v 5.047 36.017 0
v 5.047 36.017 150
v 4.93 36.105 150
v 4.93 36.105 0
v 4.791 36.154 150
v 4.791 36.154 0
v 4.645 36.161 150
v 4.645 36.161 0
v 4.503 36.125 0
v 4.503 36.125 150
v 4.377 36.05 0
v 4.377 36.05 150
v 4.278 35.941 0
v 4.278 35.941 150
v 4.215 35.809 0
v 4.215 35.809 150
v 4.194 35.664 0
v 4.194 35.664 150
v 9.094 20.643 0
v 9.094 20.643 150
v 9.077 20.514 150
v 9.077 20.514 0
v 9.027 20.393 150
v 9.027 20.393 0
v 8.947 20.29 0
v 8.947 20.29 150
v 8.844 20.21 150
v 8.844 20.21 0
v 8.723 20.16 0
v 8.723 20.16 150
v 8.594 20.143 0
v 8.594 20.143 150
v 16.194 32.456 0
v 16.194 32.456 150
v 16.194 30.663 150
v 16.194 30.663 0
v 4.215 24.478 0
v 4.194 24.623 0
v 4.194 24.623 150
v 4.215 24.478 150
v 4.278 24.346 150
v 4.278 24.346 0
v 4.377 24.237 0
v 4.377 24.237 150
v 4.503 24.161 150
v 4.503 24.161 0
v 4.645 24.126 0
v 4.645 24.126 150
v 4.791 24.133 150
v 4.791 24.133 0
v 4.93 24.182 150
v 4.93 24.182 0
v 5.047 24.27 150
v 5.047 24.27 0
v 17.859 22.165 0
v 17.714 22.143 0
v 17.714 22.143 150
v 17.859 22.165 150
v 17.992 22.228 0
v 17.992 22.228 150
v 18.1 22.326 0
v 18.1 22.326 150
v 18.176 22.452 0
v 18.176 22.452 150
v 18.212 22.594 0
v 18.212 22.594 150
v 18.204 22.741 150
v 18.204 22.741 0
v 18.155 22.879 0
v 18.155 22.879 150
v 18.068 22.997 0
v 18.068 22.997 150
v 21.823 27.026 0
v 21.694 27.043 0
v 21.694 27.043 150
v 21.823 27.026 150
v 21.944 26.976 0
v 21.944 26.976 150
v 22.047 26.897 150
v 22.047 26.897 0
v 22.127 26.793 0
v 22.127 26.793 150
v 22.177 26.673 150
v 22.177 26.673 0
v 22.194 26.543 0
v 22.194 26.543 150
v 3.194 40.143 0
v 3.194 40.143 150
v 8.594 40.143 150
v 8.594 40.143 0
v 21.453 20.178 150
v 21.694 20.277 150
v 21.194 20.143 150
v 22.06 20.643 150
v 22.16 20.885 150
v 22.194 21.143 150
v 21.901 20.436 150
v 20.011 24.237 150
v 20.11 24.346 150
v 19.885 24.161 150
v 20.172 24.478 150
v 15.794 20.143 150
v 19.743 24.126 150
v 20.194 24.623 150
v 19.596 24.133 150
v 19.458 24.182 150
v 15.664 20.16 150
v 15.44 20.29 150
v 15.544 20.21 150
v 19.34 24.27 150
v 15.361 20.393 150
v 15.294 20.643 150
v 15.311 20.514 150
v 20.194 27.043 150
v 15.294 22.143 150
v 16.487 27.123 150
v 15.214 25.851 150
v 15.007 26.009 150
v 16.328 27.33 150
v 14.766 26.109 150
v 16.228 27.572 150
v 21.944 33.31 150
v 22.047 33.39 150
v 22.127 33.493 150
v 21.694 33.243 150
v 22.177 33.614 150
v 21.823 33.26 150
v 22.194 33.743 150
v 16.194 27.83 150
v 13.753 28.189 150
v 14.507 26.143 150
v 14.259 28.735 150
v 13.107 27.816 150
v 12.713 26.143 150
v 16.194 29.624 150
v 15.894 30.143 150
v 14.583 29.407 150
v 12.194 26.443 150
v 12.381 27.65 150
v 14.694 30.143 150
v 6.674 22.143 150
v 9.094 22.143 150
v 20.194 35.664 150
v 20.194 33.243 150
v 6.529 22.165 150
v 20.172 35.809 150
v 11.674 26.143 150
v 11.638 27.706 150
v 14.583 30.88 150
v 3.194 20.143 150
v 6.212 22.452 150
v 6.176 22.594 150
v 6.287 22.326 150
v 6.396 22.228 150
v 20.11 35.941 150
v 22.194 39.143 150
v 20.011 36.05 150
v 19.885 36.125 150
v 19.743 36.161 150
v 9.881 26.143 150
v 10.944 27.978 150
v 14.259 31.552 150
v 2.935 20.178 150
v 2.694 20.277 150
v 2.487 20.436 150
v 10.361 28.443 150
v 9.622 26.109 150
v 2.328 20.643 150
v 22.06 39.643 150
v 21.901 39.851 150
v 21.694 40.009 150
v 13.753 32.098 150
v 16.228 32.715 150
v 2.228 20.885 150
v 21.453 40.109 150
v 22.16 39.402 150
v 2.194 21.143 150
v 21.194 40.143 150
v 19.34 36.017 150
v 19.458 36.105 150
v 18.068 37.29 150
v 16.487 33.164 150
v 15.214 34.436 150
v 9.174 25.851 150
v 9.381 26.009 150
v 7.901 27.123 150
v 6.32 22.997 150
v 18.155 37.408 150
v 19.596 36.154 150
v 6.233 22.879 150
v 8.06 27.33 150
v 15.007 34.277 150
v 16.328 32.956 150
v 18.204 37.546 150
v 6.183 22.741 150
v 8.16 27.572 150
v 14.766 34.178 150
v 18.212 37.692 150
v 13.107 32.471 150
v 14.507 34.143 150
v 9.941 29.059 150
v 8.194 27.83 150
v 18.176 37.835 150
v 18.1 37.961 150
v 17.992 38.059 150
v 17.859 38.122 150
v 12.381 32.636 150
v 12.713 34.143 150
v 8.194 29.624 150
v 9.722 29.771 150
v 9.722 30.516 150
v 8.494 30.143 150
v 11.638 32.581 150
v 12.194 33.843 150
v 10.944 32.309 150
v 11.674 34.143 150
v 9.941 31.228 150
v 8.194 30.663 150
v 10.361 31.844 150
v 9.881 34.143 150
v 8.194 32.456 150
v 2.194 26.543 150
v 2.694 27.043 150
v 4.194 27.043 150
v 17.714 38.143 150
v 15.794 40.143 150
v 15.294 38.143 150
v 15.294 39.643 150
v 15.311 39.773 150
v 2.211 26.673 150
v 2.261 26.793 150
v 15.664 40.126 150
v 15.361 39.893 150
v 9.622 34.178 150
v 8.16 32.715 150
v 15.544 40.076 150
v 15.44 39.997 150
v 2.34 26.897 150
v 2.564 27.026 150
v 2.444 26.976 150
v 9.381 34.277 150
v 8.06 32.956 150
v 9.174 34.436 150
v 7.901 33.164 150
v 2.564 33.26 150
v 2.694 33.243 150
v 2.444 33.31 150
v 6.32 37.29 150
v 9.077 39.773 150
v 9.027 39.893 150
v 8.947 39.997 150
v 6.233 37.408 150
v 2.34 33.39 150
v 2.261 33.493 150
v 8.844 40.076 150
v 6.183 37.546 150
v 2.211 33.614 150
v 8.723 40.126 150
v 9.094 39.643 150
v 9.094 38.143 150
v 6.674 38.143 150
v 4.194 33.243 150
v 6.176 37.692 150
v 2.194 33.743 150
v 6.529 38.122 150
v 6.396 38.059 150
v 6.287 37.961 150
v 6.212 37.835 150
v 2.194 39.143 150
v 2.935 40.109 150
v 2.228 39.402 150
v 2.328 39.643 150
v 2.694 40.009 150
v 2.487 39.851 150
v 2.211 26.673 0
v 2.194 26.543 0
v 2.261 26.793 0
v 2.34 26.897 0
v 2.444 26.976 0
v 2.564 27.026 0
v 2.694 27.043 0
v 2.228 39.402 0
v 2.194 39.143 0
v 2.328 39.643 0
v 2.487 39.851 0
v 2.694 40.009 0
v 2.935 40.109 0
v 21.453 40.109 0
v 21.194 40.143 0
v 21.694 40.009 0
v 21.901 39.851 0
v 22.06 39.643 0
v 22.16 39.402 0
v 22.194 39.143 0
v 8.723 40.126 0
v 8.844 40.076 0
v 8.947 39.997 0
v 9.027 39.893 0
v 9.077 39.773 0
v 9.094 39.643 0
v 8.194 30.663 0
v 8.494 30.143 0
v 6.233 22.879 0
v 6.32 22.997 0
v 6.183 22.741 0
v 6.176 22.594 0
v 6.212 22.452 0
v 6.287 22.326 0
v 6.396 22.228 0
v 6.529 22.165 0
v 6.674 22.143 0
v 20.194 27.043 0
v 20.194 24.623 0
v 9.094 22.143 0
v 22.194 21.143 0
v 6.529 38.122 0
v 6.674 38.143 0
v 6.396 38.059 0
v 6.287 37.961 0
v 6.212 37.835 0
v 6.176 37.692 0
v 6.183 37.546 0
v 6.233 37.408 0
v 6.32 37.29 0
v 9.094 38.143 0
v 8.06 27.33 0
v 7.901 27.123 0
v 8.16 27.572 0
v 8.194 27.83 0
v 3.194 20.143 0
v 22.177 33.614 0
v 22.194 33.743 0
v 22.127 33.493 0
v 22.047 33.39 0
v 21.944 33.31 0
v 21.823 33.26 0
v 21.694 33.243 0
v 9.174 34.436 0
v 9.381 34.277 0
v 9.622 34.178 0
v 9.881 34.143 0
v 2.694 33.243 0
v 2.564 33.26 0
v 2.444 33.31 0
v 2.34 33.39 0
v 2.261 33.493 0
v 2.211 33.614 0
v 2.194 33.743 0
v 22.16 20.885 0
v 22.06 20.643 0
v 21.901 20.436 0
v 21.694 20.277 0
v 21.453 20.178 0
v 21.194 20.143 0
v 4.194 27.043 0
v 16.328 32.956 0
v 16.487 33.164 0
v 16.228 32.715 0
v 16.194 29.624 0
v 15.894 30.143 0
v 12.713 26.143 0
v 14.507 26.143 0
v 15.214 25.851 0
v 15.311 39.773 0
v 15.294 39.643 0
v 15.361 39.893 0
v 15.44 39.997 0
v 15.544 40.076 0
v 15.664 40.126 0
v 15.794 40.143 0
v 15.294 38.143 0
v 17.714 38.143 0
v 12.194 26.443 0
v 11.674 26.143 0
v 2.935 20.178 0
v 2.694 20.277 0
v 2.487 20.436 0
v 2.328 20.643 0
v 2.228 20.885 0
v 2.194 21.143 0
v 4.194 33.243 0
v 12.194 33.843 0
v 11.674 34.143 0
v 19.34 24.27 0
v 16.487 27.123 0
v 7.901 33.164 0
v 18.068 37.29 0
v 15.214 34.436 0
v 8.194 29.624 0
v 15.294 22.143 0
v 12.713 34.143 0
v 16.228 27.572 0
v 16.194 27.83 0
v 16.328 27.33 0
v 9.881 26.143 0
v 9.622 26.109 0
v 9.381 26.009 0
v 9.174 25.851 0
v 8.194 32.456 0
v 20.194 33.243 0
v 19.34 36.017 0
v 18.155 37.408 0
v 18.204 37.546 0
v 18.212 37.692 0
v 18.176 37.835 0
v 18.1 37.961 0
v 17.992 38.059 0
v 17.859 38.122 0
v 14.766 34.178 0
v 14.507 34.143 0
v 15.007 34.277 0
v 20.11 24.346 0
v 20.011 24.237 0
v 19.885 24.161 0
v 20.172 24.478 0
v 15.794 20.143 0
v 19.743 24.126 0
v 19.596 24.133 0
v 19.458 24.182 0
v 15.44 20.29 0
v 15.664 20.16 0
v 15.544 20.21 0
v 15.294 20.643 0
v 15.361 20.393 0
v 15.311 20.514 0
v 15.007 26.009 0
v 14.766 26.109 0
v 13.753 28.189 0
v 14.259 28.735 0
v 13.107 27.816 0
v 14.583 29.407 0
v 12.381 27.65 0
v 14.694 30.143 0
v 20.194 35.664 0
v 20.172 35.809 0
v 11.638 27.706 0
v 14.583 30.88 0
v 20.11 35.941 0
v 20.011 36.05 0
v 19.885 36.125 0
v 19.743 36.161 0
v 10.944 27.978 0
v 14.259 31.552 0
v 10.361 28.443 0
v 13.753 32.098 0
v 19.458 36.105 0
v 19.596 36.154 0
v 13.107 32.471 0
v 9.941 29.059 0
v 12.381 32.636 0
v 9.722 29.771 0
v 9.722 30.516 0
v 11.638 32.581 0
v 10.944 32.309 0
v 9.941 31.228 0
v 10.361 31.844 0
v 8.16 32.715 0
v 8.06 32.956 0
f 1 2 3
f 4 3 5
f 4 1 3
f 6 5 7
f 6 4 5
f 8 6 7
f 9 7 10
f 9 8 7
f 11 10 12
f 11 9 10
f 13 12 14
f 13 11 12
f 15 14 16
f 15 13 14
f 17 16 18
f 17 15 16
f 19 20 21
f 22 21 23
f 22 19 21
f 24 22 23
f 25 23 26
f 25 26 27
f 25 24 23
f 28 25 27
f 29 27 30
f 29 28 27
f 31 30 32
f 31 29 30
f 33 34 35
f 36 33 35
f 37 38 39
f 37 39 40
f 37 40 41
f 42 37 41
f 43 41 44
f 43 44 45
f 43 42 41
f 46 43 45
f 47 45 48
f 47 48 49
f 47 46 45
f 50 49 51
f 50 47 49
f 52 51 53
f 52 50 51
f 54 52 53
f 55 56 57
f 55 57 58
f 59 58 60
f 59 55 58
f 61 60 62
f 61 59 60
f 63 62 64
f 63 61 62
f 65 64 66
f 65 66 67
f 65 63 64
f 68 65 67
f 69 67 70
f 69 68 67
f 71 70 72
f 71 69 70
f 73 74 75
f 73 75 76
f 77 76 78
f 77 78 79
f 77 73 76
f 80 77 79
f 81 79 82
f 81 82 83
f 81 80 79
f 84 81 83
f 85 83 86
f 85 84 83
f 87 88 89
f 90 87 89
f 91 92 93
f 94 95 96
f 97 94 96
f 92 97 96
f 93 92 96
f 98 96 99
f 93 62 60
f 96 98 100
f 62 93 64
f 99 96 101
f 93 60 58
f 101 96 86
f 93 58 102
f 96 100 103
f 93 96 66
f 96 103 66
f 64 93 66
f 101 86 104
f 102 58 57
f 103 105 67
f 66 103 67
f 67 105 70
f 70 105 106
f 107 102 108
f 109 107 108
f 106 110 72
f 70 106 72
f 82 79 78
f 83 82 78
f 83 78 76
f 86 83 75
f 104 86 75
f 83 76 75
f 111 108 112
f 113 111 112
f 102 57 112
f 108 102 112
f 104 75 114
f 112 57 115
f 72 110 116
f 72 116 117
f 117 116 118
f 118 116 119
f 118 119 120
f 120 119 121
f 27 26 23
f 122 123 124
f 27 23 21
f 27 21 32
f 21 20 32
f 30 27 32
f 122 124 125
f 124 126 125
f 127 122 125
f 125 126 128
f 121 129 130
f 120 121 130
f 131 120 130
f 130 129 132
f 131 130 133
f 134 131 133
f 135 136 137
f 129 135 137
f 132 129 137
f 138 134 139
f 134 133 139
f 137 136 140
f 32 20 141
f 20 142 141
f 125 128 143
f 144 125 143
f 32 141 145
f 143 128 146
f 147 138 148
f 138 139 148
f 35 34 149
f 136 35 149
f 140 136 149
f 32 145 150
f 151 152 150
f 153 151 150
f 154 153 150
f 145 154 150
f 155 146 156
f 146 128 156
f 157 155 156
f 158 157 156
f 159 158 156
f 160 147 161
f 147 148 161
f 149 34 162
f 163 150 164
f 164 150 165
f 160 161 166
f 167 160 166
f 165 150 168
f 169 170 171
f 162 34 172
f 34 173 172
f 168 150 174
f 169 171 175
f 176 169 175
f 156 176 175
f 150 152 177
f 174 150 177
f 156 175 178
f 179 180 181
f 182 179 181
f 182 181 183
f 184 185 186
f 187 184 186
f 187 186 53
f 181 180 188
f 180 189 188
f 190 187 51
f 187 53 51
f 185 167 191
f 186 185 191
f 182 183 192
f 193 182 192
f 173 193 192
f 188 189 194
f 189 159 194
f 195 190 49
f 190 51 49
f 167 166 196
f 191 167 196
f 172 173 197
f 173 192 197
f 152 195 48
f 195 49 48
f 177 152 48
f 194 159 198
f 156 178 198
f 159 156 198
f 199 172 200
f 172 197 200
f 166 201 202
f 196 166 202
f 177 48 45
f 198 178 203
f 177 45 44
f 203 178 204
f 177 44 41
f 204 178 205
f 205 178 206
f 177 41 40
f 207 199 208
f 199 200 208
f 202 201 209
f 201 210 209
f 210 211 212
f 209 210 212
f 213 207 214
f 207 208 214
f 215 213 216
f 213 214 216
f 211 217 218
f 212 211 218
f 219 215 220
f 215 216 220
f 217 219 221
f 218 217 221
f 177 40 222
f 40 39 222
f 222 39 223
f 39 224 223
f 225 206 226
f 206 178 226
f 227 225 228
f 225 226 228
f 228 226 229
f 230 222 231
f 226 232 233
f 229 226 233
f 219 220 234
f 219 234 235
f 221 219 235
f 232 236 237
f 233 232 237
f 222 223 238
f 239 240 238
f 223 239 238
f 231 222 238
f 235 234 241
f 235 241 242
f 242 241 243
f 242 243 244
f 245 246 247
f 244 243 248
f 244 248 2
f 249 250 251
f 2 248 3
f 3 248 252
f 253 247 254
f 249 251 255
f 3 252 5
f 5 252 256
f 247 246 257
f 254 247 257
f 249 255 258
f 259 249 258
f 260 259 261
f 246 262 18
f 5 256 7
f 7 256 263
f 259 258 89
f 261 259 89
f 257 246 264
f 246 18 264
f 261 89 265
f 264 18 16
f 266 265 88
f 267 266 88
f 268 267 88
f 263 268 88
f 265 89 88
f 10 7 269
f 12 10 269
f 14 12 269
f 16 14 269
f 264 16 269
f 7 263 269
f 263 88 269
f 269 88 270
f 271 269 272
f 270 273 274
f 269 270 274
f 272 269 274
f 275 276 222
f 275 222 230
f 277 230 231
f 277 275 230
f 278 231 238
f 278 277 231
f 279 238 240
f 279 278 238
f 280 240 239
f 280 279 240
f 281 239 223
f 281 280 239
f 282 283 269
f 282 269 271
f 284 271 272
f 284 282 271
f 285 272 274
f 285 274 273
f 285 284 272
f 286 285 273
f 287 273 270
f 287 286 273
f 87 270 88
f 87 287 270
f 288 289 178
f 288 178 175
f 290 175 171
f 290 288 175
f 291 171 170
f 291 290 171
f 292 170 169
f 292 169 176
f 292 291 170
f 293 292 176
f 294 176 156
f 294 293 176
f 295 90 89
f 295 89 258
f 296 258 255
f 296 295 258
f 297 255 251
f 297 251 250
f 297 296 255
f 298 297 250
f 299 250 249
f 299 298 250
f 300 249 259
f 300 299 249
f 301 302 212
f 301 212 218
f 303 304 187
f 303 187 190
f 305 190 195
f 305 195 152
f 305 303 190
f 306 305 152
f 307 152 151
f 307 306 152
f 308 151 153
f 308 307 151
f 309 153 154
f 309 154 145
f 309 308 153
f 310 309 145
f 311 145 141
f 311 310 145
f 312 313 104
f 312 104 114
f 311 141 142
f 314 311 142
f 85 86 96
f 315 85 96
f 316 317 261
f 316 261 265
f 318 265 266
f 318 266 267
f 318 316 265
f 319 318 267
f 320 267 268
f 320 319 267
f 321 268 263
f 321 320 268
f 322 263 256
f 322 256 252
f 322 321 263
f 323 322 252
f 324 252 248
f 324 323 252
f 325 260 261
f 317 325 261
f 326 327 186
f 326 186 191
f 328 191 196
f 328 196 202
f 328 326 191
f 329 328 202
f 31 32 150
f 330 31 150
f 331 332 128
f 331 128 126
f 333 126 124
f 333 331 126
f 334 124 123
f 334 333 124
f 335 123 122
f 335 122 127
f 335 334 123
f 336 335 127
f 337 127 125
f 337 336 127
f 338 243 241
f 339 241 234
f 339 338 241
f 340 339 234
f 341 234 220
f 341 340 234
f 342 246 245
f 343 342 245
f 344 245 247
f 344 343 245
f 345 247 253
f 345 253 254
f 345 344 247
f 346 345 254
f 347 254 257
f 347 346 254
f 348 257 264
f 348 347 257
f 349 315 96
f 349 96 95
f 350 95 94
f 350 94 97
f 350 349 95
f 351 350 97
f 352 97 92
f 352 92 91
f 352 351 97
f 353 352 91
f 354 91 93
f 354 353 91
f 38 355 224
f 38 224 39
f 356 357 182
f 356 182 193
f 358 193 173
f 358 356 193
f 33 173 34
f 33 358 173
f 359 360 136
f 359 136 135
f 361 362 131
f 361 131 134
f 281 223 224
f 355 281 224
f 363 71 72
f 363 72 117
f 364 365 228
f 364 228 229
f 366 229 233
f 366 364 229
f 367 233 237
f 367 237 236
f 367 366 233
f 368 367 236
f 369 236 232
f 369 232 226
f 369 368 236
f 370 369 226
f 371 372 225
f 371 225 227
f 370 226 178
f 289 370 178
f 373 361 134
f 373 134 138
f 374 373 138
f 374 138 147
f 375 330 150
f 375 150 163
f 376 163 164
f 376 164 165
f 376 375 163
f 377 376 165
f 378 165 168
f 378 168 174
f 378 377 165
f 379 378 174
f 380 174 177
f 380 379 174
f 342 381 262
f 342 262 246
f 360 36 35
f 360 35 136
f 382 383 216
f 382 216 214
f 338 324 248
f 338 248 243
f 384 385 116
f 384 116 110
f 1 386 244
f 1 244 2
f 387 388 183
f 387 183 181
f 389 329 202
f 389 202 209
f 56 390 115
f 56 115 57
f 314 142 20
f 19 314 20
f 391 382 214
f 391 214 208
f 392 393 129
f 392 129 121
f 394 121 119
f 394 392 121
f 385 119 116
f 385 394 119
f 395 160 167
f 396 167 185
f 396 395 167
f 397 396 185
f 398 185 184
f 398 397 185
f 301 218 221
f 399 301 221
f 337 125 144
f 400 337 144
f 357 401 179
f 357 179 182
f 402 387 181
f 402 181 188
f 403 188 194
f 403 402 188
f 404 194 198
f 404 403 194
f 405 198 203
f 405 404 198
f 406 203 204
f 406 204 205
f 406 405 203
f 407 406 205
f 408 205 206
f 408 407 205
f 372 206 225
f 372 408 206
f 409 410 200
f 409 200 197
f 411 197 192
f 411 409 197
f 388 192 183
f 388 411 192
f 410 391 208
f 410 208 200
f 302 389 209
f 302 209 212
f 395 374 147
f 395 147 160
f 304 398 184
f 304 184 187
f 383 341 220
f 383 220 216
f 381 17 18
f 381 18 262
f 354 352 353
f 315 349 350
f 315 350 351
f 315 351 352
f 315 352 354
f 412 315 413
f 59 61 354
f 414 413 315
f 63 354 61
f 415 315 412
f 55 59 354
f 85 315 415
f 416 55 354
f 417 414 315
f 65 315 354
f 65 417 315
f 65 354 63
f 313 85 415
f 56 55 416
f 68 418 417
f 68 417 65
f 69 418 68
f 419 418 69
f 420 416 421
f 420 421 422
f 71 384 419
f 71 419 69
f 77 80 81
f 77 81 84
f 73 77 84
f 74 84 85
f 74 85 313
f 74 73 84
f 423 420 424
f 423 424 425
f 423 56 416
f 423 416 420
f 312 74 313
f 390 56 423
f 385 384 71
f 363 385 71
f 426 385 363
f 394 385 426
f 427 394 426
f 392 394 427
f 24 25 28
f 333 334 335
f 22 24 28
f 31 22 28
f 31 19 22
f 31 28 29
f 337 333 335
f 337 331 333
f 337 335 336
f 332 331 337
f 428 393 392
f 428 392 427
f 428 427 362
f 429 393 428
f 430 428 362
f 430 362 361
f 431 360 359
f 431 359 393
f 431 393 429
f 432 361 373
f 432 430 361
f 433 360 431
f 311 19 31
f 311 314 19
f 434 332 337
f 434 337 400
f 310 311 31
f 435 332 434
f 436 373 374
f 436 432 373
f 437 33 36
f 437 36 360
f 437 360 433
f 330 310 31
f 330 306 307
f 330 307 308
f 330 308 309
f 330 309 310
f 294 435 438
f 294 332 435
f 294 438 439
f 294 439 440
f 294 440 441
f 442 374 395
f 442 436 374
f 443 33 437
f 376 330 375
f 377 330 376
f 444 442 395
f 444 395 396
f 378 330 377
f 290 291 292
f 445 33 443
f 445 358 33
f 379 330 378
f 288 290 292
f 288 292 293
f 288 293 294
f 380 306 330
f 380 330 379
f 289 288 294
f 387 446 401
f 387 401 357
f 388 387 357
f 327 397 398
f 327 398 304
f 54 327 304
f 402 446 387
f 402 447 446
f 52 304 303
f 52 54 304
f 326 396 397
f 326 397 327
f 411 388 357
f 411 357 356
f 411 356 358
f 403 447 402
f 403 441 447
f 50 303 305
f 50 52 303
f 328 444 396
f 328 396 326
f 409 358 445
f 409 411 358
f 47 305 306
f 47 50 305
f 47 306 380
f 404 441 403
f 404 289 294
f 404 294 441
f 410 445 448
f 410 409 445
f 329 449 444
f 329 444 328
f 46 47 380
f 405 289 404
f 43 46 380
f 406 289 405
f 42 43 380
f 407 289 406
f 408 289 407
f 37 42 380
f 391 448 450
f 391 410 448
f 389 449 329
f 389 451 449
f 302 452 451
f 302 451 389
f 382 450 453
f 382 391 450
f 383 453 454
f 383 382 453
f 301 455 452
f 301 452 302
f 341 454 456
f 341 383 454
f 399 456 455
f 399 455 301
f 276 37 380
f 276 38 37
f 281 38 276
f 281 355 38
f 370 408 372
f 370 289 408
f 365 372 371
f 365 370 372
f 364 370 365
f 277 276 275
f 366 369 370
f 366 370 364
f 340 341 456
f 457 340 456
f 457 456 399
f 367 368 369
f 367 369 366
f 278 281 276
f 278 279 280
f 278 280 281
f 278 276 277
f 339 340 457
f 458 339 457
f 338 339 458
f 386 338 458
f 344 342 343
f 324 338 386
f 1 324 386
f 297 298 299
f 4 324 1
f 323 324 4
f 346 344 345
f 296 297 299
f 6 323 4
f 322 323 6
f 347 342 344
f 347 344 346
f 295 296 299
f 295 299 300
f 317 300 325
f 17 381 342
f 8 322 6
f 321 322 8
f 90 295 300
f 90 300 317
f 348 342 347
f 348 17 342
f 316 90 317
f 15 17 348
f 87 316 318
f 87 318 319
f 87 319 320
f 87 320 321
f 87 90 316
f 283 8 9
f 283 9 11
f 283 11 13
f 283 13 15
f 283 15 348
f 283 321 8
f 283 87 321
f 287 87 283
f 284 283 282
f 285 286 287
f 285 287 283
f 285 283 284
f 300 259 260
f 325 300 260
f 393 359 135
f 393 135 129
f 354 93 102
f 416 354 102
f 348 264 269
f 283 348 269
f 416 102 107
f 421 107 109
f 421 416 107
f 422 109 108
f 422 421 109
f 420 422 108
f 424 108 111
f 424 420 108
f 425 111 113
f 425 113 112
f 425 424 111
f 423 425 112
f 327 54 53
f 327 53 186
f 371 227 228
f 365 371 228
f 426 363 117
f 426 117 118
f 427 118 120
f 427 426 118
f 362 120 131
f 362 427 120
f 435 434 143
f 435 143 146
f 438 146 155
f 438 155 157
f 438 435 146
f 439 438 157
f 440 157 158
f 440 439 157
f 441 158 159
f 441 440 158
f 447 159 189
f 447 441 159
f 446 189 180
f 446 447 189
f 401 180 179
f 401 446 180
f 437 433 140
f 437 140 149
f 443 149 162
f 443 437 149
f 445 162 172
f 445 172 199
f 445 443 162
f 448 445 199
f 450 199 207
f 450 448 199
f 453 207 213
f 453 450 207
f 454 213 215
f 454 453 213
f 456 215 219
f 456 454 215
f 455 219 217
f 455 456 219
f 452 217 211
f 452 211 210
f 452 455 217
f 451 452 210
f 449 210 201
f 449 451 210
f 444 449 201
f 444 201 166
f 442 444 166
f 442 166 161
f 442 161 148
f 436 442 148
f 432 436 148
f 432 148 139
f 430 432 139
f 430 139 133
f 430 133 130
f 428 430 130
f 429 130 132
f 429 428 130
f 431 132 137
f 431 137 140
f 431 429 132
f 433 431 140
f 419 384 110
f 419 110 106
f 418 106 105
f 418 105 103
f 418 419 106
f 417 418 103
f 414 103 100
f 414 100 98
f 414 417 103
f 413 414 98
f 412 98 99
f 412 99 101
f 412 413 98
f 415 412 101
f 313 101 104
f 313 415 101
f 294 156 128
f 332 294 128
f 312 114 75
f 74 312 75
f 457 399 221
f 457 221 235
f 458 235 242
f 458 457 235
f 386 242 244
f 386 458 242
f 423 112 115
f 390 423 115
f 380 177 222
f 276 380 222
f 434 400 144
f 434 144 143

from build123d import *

# Parameters (mm, degrees)
SKETCH_1_R      = 2.5
EXTRUDE_1_DEPTH = 150


with BuildPart() as part:
    # 草图1 → 凸台-拉伸1 (new body)
    with BuildSketch(Plane.XY):
        with BuildLine():
            Line((16.486773435, 27.123343944), (19.340326826, 24.269790554))
            ThreePointArc((19.340326826, 24.269790554), (19.885221932, 24.161404178), (20.193880216, 24.623343944))
            Line((20.193880216, 24.623343944), (20.193880216, 27.043444957))
            Line((20.193880216, 27.043444957), (21.693880216, 27.043444957))
            ThreePointArc((21.693880216, 27.043444957), (22.047433607, 26.896998348), (22.193880216, 26.543444957))
            Line((22.193880216, 26.543444957), (22.193880216, 21.143444957))
            ThreePointArc((22.193880216, 21.143444957), (21.900986997, 20.436338176), (21.193880216, 20.143444957))
            Line((21.193880216, 20.143444957), (15.793880216, 20.143444957))
            ThreePointArc((15.793880216, 20.143444957), (15.440326826, 20.289891566), (15.293880216, 20.643444957))
            Line((15.293880216, 20.643444957), (15.293880216, 22.143444957))
            Line((15.293880216, 22.143444957), (17.713981229, 22.143444957))
            ThreePointArc((17.713981229, 22.143444957), (18.175920995, 22.452103241), (18.06753462, 22.996998348))
            Line((18.06753462, 22.996998348), (15.213981229, 25.850551738))
            ThreePointArc((15.213981229, 25.850551738), (14.88955788, 26.06732449), (14.506874448, 26.143444957))
            Line((14.506874448, 26.143444957), (12.713495459, 26.143444957))
            Line((12.713495459, 26.143444957), (12.193880216, 26.443444957))
            Line((12.193880216, 26.443444957), (11.674264974, 26.143444957))
            Line((11.674264974, 26.143444957), (9.880885985, 26.143444957))
            ThreePointArc((9.880885985, 26.143444957), (9.498202552, 26.06732449), (9.173779204, 25.850551738))
            Line((9.173779204, 25.850551738), (6.320225813, 22.996998348))
            ThreePointArc((6.320225813, 22.996998348), (6.211839437, 22.452103241), (6.673779204, 22.143444957))
            Line((6.673779204, 22.143444957), (9.093880216, 22.143444957))
            Line((9.093880216, 22.143444957), (9.093880216, 20.643444957))
            ThreePointArc((9.093880216, 20.643444957), (8.947433607, 20.289891566), (8.593880216, 20.143444957))
            Line((8.593880216, 20.143444957), (3.193880216, 20.143444957))
            ThreePointArc((3.193880216, 20.143444957), (2.486773435, 20.436338176), (2.193880216, 21.143444957))
            Line((2.193880216, 21.143444957), (2.193880216, 26.543444957))
            ThreePointArc((2.193880216, 26.543444957), (2.340326826, 26.896998348), (2.693880216, 27.043444957))
            Line((2.693880216, 27.043444957), (4.193880216, 27.043444957))
            Line((4.193880216, 27.043444957), (4.193880216, 24.623343944))
            ThreePointArc((4.193880216, 24.623343944), (4.5025385, 24.161404178), (5.047433607, 24.269790554))
            Line((5.047433607, 24.269790554), (7.900986997, 27.123343944))
            ThreePointArc((7.900986997, 27.123343944), (8.117759749, 27.447767293), (8.193880216, 27.830450726))
            Line((8.193880216, 27.830450726), (8.193880216, 29.623829715))
            Line((8.193880216, 29.623829715), (8.493880216, 30.143444957))
            Line((8.493880216, 30.143444957), (8.193880216, 30.663060199))
            Line((8.193880216, 30.663060199), (8.193880216, 32.456439189))
            ThreePointArc((8.193880216, 32.456439189), (8.117759749, 32.839122621), (7.900986997, 33.16354597))
            Line((7.900986997, 33.16354597), (5.047433607, 36.01709936))
            ThreePointArc((5.047433607, 36.01709936), (4.5025385, 36.125485736), (4.193880216, 35.66354597))
            Line((4.193880216, 35.66354597), (4.193880216, 33.243444957))
            Line((4.193880216, 33.243444957), (2.693880216, 33.243444957))
            ThreePointArc((2.693880216, 33.243444957), (2.340326826, 33.389891566), (2.193880216, 33.743444957))
            Line((2.193880216, 33.743444957), (2.193880216, 39.143444957))
            ThreePointArc((2.193880216, 39.143444957), (2.486773435, 39.850551738), (3.193880216, 40.143444957))
            Line((3.193880216, 40.143444957), (8.593880216, 40.143444957))
            ThreePointArc((8.593880216, 40.143444957), (8.947433607, 39.996998348), (9.093880216, 39.643444957))
            Line((9.093880216, 39.643444957), (9.093880216, 38.143444957))
            Line((9.093880216, 38.143444957), (6.673779204, 38.143444957))
            ThreePointArc((6.673779204, 38.143444957), (6.211839437, 37.834786673), (6.320225813, 37.289891566))
            Line((6.320225813, 37.289891566), (9.173779204, 34.436338176))
            ThreePointArc((9.173779204, 34.436338176), (9.498202552, 34.219565425), (9.880885985, 34.143444957))
            Line((9.880885985, 34.143444957), (11.674264974, 34.143444957))
            Line((11.674264974, 34.143444957), (12.193880216, 33.843444957))
            Line((12.193880216, 33.843444957), (12.713495459, 34.143444957))
            Line((12.713495459, 34.143444957), (14.506874448, 34.143444957))
            ThreePointArc((14.506874448, 34.143444957), (14.88955788, 34.219565425), (15.213981229, 34.436338176))
            Line((15.213981229, 34.436338176), (18.06753462, 37.289891566))
            ThreePointArc((18.06753462, 37.289891566), (18.175920995, 37.834786673), (17.713981229, 38.143444957))
            Line((17.713981229, 38.143444957), (15.293880216, 38.143444957))
            Line((15.293880216, 38.143444957), (15.293880216, 39.643444957))
            ThreePointArc((15.293880216, 39.643444957), (15.440326826, 39.996998348), (15.793880216, 40.143444957))
            Line((15.793880216, 40.143444957), (21.193880216, 40.143444957))
            ThreePointArc((21.193880216, 40.143444957), (21.900986997, 39.850551738), (22.193880216, 39.143444957))
            Line((22.193880216, 39.143444957), (22.193880216, 33.743444957))
            ThreePointArc((22.193880216, 33.743444957), (22.047433607, 33.389891566), (21.693880216, 33.243444957))
            Line((21.693880216, 33.243444957), (20.193880216, 33.243444957))
            Line((20.193880216, 33.243444957), (20.193880216, 35.66354597))
            ThreePointArc((20.193880216, 35.66354597), (19.885221932, 36.125485736), (19.340326826, 36.01709936))
            Line((19.340326826, 36.01709936), (16.486773435, 33.16354597))
            ThreePointArc((16.486773435, 33.16354597), (16.270000684, 32.839122621), (16.193880216, 32.456439189))
            Line((16.193880216, 32.456439189), (16.193880216, 30.663060199))
            Line((16.193880216, 30.663060199), (15.893880216, 30.143444957))
            Line((15.893880216, 30.143444957), (16.193880216, 29.623829715))
            Line((16.193880216, 29.623829715), (16.193880216, 27.830450726))
            ThreePointArc((16.193880216, 27.830450726), (16.270000684, 27.447767293), (16.486773435, 27.123343944))
        make_face()
        with Locations((12.193880216, 30.143444957)):
            Circle(SKETCH_1_R, mode=Mode.SUBTRACT)
    extrude(amount=EXTRUDE_1_DEPTH)


solid = part.part
